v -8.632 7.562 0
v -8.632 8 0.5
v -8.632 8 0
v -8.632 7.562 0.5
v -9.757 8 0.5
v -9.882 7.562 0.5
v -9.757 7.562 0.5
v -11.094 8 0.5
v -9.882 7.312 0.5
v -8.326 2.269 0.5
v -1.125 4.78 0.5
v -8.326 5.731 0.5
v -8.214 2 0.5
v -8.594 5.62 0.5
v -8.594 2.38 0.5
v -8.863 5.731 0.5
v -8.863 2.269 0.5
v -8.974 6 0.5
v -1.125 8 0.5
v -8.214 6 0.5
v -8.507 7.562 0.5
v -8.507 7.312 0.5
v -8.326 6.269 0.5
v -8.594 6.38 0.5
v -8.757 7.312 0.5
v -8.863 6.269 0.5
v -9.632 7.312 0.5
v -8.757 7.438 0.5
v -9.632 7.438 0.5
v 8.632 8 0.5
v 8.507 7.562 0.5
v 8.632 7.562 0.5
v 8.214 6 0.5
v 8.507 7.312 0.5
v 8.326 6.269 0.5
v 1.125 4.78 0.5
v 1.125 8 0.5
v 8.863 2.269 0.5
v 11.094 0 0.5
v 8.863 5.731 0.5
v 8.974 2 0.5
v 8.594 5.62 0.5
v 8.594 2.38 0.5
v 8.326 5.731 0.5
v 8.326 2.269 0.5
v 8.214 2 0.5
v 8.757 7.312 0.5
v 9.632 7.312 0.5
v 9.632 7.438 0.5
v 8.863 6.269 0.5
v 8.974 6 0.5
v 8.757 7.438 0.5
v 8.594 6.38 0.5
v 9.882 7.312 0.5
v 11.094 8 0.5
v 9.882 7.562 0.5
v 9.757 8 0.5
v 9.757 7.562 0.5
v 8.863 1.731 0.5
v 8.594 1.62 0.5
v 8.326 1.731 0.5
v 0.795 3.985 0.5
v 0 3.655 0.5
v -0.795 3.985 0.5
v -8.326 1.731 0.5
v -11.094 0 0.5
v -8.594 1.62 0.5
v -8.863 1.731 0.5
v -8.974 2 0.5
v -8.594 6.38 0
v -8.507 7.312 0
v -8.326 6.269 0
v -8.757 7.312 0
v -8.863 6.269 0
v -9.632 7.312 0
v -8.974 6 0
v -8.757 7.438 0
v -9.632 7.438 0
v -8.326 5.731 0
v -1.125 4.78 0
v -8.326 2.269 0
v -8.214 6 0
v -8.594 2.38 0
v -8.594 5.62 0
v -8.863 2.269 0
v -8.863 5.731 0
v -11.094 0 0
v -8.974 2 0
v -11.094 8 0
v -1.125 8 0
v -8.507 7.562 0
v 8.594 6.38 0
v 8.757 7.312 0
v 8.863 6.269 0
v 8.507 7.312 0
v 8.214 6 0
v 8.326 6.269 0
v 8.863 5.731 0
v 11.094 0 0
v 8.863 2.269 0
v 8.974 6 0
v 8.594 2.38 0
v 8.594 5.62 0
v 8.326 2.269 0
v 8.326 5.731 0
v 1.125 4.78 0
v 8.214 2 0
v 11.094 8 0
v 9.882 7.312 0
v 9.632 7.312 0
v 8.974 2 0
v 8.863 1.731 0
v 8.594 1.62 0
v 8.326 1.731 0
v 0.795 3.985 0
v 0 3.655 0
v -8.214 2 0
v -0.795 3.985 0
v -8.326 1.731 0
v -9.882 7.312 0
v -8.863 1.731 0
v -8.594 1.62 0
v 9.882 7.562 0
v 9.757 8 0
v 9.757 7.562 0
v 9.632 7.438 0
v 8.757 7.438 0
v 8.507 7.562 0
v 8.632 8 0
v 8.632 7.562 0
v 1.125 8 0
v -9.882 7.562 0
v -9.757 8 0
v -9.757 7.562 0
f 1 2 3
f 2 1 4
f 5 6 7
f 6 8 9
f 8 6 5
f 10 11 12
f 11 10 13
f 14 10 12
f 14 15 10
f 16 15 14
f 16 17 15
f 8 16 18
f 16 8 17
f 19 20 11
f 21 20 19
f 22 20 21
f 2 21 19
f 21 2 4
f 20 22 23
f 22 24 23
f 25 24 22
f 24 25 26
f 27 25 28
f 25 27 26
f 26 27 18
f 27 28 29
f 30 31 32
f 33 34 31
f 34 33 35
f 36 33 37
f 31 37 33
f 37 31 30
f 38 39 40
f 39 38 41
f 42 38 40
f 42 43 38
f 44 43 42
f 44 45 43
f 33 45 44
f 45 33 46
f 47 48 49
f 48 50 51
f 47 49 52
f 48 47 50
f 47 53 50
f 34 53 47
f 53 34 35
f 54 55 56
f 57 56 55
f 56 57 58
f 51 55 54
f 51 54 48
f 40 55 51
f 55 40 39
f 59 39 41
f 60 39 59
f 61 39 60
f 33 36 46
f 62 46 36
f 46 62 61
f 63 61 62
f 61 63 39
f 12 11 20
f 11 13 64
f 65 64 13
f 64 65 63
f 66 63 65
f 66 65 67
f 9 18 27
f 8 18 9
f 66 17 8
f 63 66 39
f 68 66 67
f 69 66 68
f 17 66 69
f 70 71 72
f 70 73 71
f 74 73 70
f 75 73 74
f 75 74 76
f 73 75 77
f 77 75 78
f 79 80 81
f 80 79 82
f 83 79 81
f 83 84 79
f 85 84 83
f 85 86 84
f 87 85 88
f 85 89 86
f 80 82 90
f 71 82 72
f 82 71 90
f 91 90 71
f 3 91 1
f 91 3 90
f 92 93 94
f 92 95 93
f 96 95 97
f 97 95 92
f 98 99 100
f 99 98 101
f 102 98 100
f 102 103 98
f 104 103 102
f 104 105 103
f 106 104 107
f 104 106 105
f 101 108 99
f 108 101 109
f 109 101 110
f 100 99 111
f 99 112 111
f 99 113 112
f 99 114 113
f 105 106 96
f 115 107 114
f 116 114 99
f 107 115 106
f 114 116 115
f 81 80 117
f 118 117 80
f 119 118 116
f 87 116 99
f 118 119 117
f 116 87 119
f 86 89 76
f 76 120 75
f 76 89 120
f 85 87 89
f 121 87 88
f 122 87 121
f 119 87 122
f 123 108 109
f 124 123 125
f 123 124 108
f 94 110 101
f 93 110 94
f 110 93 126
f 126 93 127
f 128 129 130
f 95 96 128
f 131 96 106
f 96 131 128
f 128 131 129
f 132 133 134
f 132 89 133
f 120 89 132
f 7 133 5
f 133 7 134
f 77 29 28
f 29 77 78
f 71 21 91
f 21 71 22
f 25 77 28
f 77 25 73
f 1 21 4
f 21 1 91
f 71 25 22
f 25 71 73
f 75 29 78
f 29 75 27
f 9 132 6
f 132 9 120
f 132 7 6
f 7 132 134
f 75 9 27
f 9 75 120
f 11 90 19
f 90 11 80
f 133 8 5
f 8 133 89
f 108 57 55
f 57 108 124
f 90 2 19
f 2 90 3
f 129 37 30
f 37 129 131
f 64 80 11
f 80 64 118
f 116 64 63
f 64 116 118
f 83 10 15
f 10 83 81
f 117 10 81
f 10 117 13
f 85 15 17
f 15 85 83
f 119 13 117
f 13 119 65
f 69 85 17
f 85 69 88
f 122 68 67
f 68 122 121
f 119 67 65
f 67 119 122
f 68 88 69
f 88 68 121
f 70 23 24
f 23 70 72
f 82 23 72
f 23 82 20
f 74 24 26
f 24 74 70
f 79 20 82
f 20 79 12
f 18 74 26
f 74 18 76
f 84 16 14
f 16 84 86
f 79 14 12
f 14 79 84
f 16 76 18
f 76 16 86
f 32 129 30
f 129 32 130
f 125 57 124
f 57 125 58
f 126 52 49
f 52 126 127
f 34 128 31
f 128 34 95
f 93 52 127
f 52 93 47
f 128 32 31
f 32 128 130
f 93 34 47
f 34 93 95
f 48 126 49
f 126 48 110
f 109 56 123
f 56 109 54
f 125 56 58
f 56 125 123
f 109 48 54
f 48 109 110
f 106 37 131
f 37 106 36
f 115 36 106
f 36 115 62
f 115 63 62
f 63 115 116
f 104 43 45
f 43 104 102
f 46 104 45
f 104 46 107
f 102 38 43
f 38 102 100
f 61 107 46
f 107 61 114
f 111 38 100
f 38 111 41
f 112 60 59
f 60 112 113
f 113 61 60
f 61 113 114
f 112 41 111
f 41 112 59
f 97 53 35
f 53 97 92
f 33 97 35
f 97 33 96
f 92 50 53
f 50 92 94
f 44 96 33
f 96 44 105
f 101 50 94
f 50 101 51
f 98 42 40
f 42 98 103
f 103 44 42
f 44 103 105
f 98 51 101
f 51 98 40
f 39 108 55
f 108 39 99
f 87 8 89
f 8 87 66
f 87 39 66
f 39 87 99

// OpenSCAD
// file: modus.scad
//Corner Joint - allows the sides of two parts to create inlayed corner. Aids with welding.
//need to verify module math is the same throughout all parts.

module cornerjoint(Z,L,H,EndGap,PadL,PadH,CJangle,CJcenter){
    //change so that H = Z of inlayed part (usually 0.5)
    //add center and angle in degrees option, orgin far side of cut out area

     if((CJangle==0)&&(CJcenter==0))
      {    
        translate([0,0,0])
        rotate([0,0,CJangle])
        difference(){
        cube([L,H+PadH,Z]);
        translate([EndGap,H,0])
        cube([PadL,PadH,Z]);
        translate([L-EndGap-PadL,H,0])
        cube([PadL,PadH,Z]);}
      }    
else if((CJangle==90)&&(CJcenter==0))
      {    
        translate([H+PadH,0,0])
        rotate([0,0,CJangle])
        difference(){
        cube([L,H+PadH,Z]);
        translate([EndGap,H,0])
        cube([PadL,PadH,Z]);
        translate([L-EndGap-PadL,H,0])
        cube([PadL,PadH,Z]);}
      }
else if((CJangle==180)&&(CJcenter==0))       
      {    
        translate([L,H+PadH,0])
        rotate([0,0,CJangle])
        difference(){
        cube([L,H+PadH,Z]);
        translate([EndGap,H,0])
        cube([PadL,PadH,Z]);
        translate([L-EndGap-PadL,H,0])
        cube([PadL,PadH,Z]);}
      }
else if((CJangle==270)&&(CJcenter==0))
      {    
        translate([0,L,0])
        rotate([0,0,CJangle])
        difference(){
        cube([L,H+PadH,Z]);
        translate([EndGap,H,0])
        cube([PadL,PadH,Z]);
        translate([L-EndGap-PadL,H,0])
        cube([PadL,PadH,Z]);}
      }  
      
//centered     
   
else if((CJangle==0)&&(CJcenter==1))
      {    
        translate([-L/2,0,0])
        rotate([0,0,CJangle])
        difference(){
        cube([L,H+PadH,Z]);
        translate([EndGap,H,0])
        cube([PadL,PadH,Z]);
        translate([L-EndGap-PadL,H,0])
        cube([PadL,PadH,Z]);}
      }  
else if((CJangle==90)&&(CJcenter==1))
      {    
        translate([0,-L/2,0])
        rotate([0,0,CJangle])
        difference(){
        cube([L,H+PadH,Z]);
        translate([EndGap,H,0])
        cube([PadL,PadH,Z]);
        translate([L-EndGap-PadL,H,0])
        cube([PadL,PadH,Z]);}
      }
else if((CJangle==180)&&(CJcenter==1))       
      {    
        translate([L/2,0,0])
        rotate([0,0,CJangle])
        difference(){
        cube([L,H+PadH,Z]);
        translate([EndGap,H,0])
        cube([PadL,PadH,Z]);
        translate([L-EndGap-PadL,H,0])
        cube([PadL,PadH,Z]);}
      }
else if((CJangle==270)&&(CJcenter==1))
      {    
        translate([0,L/2,0])
        rotate([0,0,CJangle])
        difference(){
        cube([L,H+PadH,Z]);
        translate([EndGap,H,0])
        cube([PadL,PadH,Z]);
        translate([L-EndGap-PadL,H,0])
        cube([PadL,PadH,Z]);}
      }
} //end cornerjoint module

//Tab Insert - used to cut a hole for an abutting part to insert into. Typically aids with welding the two parts.
module tabinsert(X,Y,Z,dGap,cGap,c1,c2,c3,c4,c5,c6,c7,c8,center){
    translate([-dGap-(center*(X/2)),-dGap-(center*(Y/2)),0]){
        //main cut
        cube([X+(dGap*2),Y+(dGap*2),Z]);
        //corner c1c2
        translate([-cGap,(Y+(dGap*2))-c1+cGap,0])
            {
        cube([c2,c1,Z]);}
       //corner c3c4
       translate([(X+(dGap*2))-c3+cGap,(Y+(dGap*2))-c4+cGap,0]){
           cube([c3,c4,Z]);
       }
       //corner c5c6
       translate([(X+(dGap*2))-c6+cGap,-cGap,0])
      {
          cube([c6,c5,Z]);
      }
       
       //corner c7c8 
       translate([-cGap,-cGap,0]){
           cube([c7,c8,Z]);
       }
    
    } //end center translate
} //end tabinsert module
 
// file: vars.scad
brickW=6; 
brickL=12;
brickCH=6;

$fn=8; //defines resolution of circles. 8 is okay for review. 100  or greater should be used for for final dxf export.

dZstandard=0.5; //thickness of steel to be cut for drawer parts
fZstandard=0.5;
aZstandard=0.5; //thickness of steel to be cut for arm parts

fBOLTHOLEstandardD=1; //standard bolts used on frame
sliderodholeOD=1.2; 

dGap=0.03125; //gap between a hole cut's edge and the part sitting within the hole. //D3 appears to use 0.3125, is this in error?

//all parts set to standard thickness below
//off standard preferences can be defined below

//drawer
drawergap=0.0283;  //extra room for drawer to slide in the space between f1 and f4
drawerHgap=0.1884;  //total extra space from drawer sides to frame walls. sum of both sides.

d1z=dZstandard;
d2z=dZstandard;
d3z=dZstandard;
d4z=dZstandard;
d5z=dZstandard;
d6z=dZstandard;
d5z=dZstandard;
d7z=dZstandard;
d8z=dZstandard;
d9z=dZstandard;

//frame
f1x=24.2;
f1y=6;
f1z=0.5;


f2y=3.5;
f2z=fZstandard;

f3x=f1x;
f3y=3.5;
f3z=fZstandard;

f4y=11;
f4z=fZstandard;

f5y=3.5;
f5z=fZstandard;

f6y=8;
f6z=fZstandard;

f8y=brickW;
f8z=fZstandard;
f8boltD=1;

f9y=4.5;
f9x=43.5;  //set based on MAINcylinder
f9z=fZstandard;

f8x=f9x;

f11x=1.25;
f11z=fZstandard;

f13z=fZstandard;

//arms

a1x=4;
a1y=72; //calculate based on drawer cylinder
a1z=aZstandard;

a2x=6;
a2y=72;  //calculate based on drawer cylinder
a2z=aZstandard;

a4z=aZstandard;
a6z=aZstandard;

//
//Input your main cylinder's dimenions here
//
cylinderMAINminC2E=0; //main hydraulic cylinder's distance from center of mounting hole to the end of the shaft when fully compressed.
cylinderMAINmaxC2E=0; //main hydraulic cylinder's distance from center of mounting hole to the end of the shaft when fully extended.

//
//Input your drawer cylinder's dimenions here
//
cylinderDRAWERbodyH=3; //measured when in position, largest length from top to bottom of cylinder
cylinderDRAWERminC2C=0; //drawer's hydraulic cylinder's distance from the center of one mounting hole to the center of the other when fully compressed.
cylinderDRAWERmaxC2C=0; ///drawer's hydraulic cylinder's distance from the center of one mounting hole to the center of the other when fully extended.
cylinderDRAWERrodclevisW=2.5; //width of cylinders' clevis on end of rod
cylinderDRAWERrodclevisID=1;
cylinderDRAWERrodclevisOD=2;
cylinderDRAWERrearclevisW=2.5; //width of mounting clevis cylinder body
cylinderDRAWERrearclevisID=1;
cylinderDRAWERrearclevisOD=2;
cylinderDRAWERrearclevisClearance=3; //usable space around rear clevis pin (in diameter). be aware of hyraulic fittings.

//the following variables are calculated in order of dependence on preceding variables
d3x=brickL+(d2z*2);
d3y=brickCH-d1z;
d4x=brickW+d3z+d3z;
d4y=brickCH-d1z;
d5x=brickL+(d2z*2);
d5y=brickW;
d6x=brickL+(d2z*2);
d6y=brickCH;
d7x=cylinderDRAWERrearclevisClearance;
d7y=a4z+d8z+cylinderDRAWERbodyH;
d9x=cylinderDRAWERbodyH+d6z;
d9y=cylinderDRAWERbodyH+d8z;
d8x=brickL+(d2z*2);
d8y=max(5,(d9x-d6z));   //need to review fundamentals, 5 minimun unless d9 gets larger than d8
d1x=18.5;   //need to come up with a formula
d1y=18;     //need to come up with a formula
d2x=d8y+d6z+brickW+d3z+d5y+d3z;
d2y=brickCH;

f11y=f8y;
f6x=brickL+(d2z*2)+(f9y*2)+drawerHgap;
f8x=43.5;  //need to define based on MAINcylinder inputs


f2x=brickL+(d2z*2)+drawerHgap+(f9y*2)-(1.4*2);  //distance between large cut outs in f9

f5x=brickL+(d2z*2)+drawerHgap+(f9y*2)+(a1x*2); //distance between outer edges of each A1

f4x=f5x-0.5;   //same as f5 but minus 0.25 on each side to give a little overhang
// main file
include <vars.scad>;
use <modus.scad>;

f6p();

module f6p(){

difference(){
translate([-(f6x/2),0,0])
cube([f6x,f6y,f6z]);
translate([-(f6x/2),0,0])
cuts();
translate([(f6x/2),0,0])
mirror([1,0,0])
cuts();
} //end difference
module cuts(){
    
    translate([(f6x-f2x)/2,f6y-f2z,0])
        tabinsert(1,f2z,f6z,0.0625,0.125,0,0,0,0,0.25,0.25,0.25,0.25,0);    //F2
    
//need to change this section to match MAINcylinder specs
    translate([(f6x/2)-1.125,f6y-3.22,0])
        cube([2.25,3.22,f6z]);  
    translate([f6x/2,f6y-3.22,0])
        cylinder(h = f6z, r = 1.125);
    
    // bolt holes to f9
    translate([((f6x-brickL-(d2z*2)-drawerHgap)/2)-2,2,0])
        cylinder(h = f6z, r = 0.38); //diameter 0.76?
    translate([((f6x-brickL-(d2z*2)-drawerHgap)/2)-2,6,0])
        cylinder(h = f6z, r = 0.38);
    
} //end cuts module
} //end f6p module
